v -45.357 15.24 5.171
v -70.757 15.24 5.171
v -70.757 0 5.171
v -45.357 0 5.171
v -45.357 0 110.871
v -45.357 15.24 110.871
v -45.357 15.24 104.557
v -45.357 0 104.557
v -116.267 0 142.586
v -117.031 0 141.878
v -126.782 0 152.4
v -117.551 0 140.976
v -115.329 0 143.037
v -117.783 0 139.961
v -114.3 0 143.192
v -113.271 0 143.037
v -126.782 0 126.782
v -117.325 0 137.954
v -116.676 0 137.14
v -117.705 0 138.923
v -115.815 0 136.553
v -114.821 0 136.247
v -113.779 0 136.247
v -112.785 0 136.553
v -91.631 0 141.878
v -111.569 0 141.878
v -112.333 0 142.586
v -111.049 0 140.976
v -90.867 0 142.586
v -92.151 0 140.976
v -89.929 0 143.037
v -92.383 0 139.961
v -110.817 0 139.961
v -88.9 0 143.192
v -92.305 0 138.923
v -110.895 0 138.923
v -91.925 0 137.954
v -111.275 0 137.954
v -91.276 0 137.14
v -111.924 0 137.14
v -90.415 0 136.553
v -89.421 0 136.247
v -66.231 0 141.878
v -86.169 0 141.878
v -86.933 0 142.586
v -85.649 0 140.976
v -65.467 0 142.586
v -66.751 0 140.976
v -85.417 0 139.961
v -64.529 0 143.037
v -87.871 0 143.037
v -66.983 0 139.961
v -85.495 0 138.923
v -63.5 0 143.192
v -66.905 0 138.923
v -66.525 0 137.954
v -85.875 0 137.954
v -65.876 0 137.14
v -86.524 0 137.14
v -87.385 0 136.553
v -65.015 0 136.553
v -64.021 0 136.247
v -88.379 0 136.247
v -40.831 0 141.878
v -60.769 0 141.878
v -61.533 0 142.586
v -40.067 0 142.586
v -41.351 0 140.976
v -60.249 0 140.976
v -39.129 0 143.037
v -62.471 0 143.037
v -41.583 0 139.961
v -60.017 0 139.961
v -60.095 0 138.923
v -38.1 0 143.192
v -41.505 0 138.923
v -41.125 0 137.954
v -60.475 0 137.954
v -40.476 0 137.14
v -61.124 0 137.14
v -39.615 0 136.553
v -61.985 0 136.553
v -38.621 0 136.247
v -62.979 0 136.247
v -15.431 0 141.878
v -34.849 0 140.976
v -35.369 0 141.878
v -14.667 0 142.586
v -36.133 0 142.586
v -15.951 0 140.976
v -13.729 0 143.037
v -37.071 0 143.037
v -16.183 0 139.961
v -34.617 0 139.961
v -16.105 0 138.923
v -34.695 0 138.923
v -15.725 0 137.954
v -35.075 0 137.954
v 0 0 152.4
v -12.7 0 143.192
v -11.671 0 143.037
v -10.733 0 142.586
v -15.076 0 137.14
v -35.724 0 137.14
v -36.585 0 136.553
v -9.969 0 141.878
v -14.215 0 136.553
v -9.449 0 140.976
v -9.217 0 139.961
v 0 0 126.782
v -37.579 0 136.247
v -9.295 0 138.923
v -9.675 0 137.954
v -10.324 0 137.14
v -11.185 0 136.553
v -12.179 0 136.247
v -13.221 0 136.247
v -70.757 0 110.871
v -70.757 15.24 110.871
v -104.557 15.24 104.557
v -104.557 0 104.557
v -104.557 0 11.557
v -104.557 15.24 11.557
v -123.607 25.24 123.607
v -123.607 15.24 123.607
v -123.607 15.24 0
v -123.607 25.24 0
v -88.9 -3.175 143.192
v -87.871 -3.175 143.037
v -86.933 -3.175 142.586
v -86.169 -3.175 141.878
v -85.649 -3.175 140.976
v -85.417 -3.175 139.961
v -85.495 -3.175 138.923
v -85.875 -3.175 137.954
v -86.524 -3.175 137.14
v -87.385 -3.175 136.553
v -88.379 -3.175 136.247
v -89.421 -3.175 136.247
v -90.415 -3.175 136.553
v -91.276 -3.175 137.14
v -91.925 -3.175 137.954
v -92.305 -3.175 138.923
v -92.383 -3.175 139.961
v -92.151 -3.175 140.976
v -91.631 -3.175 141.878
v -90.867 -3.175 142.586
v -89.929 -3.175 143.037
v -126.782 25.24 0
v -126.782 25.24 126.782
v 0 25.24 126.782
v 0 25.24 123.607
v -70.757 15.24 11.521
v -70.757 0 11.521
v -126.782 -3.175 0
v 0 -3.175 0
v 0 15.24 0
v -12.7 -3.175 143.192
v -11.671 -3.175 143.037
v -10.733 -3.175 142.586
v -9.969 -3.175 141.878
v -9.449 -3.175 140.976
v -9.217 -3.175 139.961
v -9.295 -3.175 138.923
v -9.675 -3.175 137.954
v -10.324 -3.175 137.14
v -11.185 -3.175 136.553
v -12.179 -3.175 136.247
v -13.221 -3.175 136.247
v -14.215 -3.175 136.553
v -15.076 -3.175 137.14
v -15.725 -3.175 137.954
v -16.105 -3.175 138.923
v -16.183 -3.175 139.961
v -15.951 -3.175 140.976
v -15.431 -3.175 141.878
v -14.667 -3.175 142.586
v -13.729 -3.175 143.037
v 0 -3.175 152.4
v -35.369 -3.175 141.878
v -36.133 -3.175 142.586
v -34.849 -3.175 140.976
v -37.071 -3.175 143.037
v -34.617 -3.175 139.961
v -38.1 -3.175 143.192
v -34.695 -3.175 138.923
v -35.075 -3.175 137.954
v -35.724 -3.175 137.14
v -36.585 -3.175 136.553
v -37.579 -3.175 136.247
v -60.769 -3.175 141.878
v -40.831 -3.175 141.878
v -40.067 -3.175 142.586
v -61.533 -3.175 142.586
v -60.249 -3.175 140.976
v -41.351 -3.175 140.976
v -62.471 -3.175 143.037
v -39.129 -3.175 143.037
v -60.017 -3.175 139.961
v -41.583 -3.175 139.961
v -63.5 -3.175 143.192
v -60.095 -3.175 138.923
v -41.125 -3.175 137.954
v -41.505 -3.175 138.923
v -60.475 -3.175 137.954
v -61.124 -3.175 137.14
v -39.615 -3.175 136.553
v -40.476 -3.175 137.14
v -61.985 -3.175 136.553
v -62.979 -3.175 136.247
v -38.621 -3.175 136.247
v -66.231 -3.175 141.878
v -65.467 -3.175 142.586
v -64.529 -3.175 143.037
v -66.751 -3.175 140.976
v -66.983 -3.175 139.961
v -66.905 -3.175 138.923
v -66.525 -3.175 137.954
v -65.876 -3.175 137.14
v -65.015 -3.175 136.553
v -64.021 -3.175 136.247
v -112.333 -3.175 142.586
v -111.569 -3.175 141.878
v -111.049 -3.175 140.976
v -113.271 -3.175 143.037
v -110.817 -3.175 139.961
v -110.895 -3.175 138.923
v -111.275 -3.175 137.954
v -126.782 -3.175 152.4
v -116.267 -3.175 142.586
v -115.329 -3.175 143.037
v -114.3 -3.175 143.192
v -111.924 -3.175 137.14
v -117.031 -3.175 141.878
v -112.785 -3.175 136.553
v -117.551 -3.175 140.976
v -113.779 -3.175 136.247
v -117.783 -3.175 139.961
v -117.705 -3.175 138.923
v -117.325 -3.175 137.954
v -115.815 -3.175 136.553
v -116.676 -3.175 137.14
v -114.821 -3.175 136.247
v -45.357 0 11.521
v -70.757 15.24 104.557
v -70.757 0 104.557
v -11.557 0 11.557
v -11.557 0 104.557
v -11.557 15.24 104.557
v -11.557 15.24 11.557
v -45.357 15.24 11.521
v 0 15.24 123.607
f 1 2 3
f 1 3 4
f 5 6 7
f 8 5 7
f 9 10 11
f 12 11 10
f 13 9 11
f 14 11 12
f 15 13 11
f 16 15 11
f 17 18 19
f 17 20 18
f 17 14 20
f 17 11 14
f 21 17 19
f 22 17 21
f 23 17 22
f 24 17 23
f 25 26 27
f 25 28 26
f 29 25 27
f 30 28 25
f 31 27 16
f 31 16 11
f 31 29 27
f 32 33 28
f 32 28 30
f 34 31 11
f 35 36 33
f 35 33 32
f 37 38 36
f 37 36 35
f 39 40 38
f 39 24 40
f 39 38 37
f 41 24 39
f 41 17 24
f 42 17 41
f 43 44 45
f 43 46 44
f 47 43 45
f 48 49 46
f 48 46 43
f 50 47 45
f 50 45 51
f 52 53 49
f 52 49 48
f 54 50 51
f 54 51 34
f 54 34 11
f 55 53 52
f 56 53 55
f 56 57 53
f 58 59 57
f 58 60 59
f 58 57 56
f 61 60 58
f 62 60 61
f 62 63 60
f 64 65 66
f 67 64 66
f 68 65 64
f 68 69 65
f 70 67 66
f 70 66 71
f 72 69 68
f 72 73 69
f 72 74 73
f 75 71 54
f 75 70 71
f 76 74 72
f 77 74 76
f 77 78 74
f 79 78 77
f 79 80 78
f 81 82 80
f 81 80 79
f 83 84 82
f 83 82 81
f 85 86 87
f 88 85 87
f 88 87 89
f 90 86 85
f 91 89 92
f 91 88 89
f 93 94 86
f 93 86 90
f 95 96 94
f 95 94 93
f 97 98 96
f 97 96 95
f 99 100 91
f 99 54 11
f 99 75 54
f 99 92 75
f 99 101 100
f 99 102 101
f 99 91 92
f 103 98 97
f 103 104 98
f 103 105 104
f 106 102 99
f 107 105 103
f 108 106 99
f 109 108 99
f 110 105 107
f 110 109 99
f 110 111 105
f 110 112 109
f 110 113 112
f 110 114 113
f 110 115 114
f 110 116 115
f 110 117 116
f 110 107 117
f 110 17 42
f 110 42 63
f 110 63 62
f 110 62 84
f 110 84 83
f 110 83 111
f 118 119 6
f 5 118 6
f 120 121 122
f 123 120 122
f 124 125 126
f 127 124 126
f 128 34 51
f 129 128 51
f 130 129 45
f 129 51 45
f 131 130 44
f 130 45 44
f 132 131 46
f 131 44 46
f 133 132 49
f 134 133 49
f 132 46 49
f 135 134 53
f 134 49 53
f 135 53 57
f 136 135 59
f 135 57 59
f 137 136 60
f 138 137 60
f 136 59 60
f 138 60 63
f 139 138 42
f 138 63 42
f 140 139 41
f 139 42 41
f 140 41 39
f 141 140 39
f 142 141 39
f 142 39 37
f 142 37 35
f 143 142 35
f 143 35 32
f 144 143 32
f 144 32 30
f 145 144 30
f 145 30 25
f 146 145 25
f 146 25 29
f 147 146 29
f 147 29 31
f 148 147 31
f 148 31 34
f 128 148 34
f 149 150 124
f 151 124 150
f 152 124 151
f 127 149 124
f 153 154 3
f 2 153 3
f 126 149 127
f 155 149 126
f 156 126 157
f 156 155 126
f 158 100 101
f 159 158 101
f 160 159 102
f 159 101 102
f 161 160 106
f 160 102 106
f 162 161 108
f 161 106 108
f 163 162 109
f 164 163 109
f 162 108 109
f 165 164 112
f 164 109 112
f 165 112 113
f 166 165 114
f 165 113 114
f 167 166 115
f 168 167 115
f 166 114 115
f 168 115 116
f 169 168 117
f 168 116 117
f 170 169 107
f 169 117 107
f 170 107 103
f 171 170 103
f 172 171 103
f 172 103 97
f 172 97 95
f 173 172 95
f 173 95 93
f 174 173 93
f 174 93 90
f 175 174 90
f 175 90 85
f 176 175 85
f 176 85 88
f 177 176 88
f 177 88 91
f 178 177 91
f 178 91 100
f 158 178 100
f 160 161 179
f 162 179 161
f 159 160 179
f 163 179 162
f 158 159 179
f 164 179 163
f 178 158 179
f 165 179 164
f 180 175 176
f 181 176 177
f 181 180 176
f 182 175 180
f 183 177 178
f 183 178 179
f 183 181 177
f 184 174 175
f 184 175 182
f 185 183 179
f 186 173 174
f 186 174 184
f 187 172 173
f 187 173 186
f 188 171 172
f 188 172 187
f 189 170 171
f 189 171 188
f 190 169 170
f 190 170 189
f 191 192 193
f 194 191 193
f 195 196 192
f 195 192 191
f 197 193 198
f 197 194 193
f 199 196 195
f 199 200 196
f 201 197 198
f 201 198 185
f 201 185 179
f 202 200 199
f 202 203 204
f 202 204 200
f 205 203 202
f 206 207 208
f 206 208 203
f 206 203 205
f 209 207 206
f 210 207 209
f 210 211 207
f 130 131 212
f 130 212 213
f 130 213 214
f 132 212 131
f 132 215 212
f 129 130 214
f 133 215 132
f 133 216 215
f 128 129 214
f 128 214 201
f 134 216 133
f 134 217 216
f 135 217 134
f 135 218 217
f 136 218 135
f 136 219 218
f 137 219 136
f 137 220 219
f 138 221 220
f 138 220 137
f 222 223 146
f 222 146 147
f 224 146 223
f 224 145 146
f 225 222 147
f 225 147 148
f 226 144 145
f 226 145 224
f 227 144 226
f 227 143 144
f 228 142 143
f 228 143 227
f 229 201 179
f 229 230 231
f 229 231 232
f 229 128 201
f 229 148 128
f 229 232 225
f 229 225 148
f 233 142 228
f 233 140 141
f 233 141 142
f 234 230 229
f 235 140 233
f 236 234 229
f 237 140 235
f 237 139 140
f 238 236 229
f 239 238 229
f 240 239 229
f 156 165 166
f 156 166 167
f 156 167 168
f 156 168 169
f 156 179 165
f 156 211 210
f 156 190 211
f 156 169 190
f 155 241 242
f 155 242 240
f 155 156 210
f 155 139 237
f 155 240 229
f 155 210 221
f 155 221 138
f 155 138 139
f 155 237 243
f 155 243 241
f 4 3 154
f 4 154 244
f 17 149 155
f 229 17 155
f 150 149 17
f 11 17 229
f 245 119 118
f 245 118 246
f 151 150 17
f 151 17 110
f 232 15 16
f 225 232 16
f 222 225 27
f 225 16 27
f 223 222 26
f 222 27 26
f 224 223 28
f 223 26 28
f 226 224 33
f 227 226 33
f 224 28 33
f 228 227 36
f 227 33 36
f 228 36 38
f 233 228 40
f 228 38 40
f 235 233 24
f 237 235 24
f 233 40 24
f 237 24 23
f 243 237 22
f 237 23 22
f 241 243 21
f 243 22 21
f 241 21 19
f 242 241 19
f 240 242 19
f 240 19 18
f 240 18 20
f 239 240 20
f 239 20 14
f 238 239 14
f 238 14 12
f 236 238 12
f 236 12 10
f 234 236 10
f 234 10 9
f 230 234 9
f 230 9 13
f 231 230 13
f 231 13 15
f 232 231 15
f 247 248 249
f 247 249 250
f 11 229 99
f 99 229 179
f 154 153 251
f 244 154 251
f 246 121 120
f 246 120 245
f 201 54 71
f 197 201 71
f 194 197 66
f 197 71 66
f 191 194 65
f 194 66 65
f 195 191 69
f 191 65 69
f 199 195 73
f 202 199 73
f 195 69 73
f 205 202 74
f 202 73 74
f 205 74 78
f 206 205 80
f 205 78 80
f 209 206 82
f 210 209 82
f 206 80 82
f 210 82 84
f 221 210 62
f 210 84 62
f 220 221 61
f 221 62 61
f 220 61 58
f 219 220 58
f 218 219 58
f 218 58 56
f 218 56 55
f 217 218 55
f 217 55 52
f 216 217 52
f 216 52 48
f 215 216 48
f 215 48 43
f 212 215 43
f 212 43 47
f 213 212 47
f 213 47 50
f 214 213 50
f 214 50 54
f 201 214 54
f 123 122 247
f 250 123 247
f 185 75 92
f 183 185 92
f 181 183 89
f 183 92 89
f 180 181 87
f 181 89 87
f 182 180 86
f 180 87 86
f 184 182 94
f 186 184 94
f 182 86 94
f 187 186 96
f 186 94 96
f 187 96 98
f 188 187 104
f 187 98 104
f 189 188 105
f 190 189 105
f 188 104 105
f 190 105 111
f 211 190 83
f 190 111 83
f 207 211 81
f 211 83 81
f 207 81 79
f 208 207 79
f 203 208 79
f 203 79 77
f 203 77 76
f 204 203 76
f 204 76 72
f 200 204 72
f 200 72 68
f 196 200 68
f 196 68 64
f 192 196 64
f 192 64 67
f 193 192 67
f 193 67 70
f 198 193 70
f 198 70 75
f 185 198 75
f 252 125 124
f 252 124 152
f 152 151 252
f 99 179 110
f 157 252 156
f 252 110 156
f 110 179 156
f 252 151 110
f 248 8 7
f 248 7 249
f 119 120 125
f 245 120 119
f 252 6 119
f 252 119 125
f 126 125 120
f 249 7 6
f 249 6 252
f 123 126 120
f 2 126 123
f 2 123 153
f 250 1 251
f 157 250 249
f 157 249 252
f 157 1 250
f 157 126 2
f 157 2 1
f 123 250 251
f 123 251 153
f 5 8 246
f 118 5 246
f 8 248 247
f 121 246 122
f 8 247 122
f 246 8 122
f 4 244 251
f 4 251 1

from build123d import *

# Parameters (mm, degrees)
SKETCH1_W               = 304.8
SKETCH1_H               = 304.8
SKETCH1_W_2             = 93
SKETCH1_H_2             = 93
BOSS_EXTRUDE1_DEPTH     = 15.24
SKETCH2_W               = 304.8
SKETCH2_H               = 304.8
BOSS_EXTRUDE2_DEPTH     = 3.175
SKETCH3_W               = 304.8
SKETCH3_H               = 304.8
SKETCH3_W_2             = 247.214
SKETCH3_H_2             = 247.214
BOSS_EXTRUDE3_DEPTH     = 10
SKETCH4_OUTSIDE_W       = 393.198
SKETCH4_OUTSIDE_H       = 393.198
SKETCH4_OUTSIDE_W_2     = 253.564
SKETCH4_OUTSIDE_H_2     = 253.564
CUT_EXTRUDE1_DEPTH      = 25.24
SKETCH5_R               = 3.4925
CUT_EXTRUDE2_DEPTH      = 217.999026726
SKETCH6_W               = 25.4
SKETCH6_H               = 6.35
CUT_EXTRUDE3_DEPTH      = 15.24
LPATTERN1_COUNT         = 2
LPATTERN1_PITCH         = 116.078
LPATTERN1_COUNT_DIR2    = 2
LPATTERN1_PITCH_DIR2    = 116.078
SKETCH7_W               = 388.208697242
SKETCH7_H               = 185.968986832
CUT_EXTRUDE4_DEPTH      = 320.069595424
SKETCH8_W               = 545.051384684
SKETCH8_H               = 463.265958
CUT_EXTRUDE5_DEPTH      = 320.069595424
SKETCH9_W               = 585.539242267
SKETCH9_H               = 383.639310532
CUT_EXTRUDE6_DEPTH      = 297.913320173
CUT_EXTRUDE7_DEPTH      = 200.841169742
CUT_EXTRUDE7_DEPTH_BACK = 200.841169742
SKETCH10_OUTSIDE_W      = 331.206
SKETCH10_OUTSIDE_H      = 356.824
SKETCH10_OUTSIDE_W_2    = 142.114384532
SKETCH10_OUTSIDE_H_2    = 171.89804786


with BuildPart() as part:
    # Sketch1 → Boss-Extrude1 (new body)
    with BuildSketch(Plane(origin=(0, 0, 0), x_dir=(1, 0, 0), z_dir=(0, 1, 0))):
        Rectangle(SKETCH1_W, SKETCH1_H)
        with Locations((58.057, 58.057)):
            Rectangle(SKETCH1_W_2, SKETCH1_H_2, mode=Mode.SUBTRACT)
        with Locations((-58.057, 58.057)):
            Rectangle(SKETCH1_W_2, SKETCH1_H_2, mode=Mode.SUBTRACT)
        with Locations((-58.057, -58.057)):
            Rectangle(SKETCH1_W_2, SKETCH1_H_2, mode=Mode.SUBTRACT)
        with Locations((58.057, -58.057)):
            Rectangle(SKETCH1_W_2, SKETCH1_H_2, mode=Mode.SUBTRACT)
    extrude(amount=BOSS_EXTRUDE1_DEPTH)

    # Sketch2 → Boss-Extrude2 (add)
    with BuildSketch(Plane(origin=(0, 0, 0), x_dir=(-1, 0, 0), z_dir=(0, -1, 0))):
        Rectangle(SKETCH2_W, SKETCH2_H)
    extrude(amount=BOSS_EXTRUDE2_DEPTH)

    # Sketch3 → Boss-Extrude3 (add)
    with BuildSketch(Plane(origin=(0, 15.24, 0), x_dir=(1, 0, 0), z_dir=(0, 1, 0))):
        Rectangle(SKETCH3_W, SKETCH3_H)
        Rectangle(SKETCH3_W_2, SKETCH3_H_2, mode=Mode.SUBTRACT)
    extrude(amount=BOSS_EXTRUDE3_DEPTH)

    # Sketch4 outside → Cut-Extrude1 (cut)
    with BuildSketch(Plane(origin=(0, 25.24, 0), x_dir=(1, 0, 0), z_dir=(0, 1, 0))):
        Rectangle(SKETCH4_OUTSIDE_W, SKETCH4_OUTSIDE_H)
        Rectangle(SKETCH4_OUTSIDE_W_2, SKETCH4_OUTSIDE_H_2, mode=Mode.SUBTRACT)
    extrude(amount=-CUT_EXTRUDE1_DEPTH, mode=Mode.SUBTRACT)

    # Sketch5 → Cut-Extrude2 (cut, through all)
    with BuildSketch(Plane(origin=(0, 0, 0), x_dir=(1, 0, 0), z_dir=(0, 1, 0))):
        with Locations(Location((-139.7, -139.7, 0), (0, 0, 270))):
            Circle(SKETCH5_R)
        with Locations(Location((-114.3, -139.7, 0), (0, 0, 270))):
            Circle(SKETCH5_R)
        with Locations(Location((-88.9, -139.7, 0), (0, 0, 270))):
            Circle(SKETCH5_R)
        with Locations(Location((-63.5, -139.7, 0), (0, 0, 270))):
            Circle(SKETCH5_R)
        with Locations(Location((-38.1, -139.7, 0), (0, 0, 270))):
            Circle(SKETCH5_R)
        with Locations(Location((-12.7, -139.7, 0), (0, 0, 270))):
            Circle(SKETCH5_R)
        with Locations(Location((12.7, -139.7, 0), (0, 0, 270))):
            Circle(SKETCH5_R)
        with Locations(Location((38.1, -139.7, 0), (0, 0, 270))):
            Circle(SKETCH5_R)
        with Locations(Location((63.5, -139.7, 0), (0, 0, 270))):
            Circle(SKETCH5_R)
        with Locations(Location((88.9, -139.7, 0), (0, 0, 270))):
            Circle(SKETCH5_R)
        with Locations(Location((114.3, -139.7, 0), (0, 0, 270))):
            Circle(SKETCH5_R)
        with Locations(Location((139.7, -139.7, 0), (0, 0, 270))):
            Circle(SKETCH5_R)
        with Locations(Location((-139.7, -114.3, 0), (0, 0, 270))):
            Circle(SKETCH5_R)
        with Locations(Location((-139.7, -88.9, 0), (0, 0, 270))):
            Circle(SKETCH5_R)
        with Locations(Location((-139.7, -63.5, 0), (0, 0, 270))):
            Circle(SKETCH5_R)
        with Locations(Location((-139.7, -38.1, 0), (0, 0, 270))):
            Circle(SKETCH5_R)
        with Locations(Location((-139.7, -12.7, 0), (0, 0, 270))):
            Circle(SKETCH5_R)
        with Locations(Location((-139.7, 12.7, 0), (0, 0, 270))):
            Circle(SKETCH5_R)
        with Locations(Location((-139.7, 38.1, 0), (0, 0, 270))):
            Circle(SKETCH5_R)
        with Locations(Location((-139.7, 63.5, 0), (0, 0, 270))):
            Circle(SKETCH5_R)
        with Locations(Location((-139.7, 88.9, 0), (0, 0, 270))):
            Circle(SKETCH5_R)
        with Locations(Location((-139.7, 114.3, 0), (0, 0, 270))):
            Circle(SKETCH5_R)
        with Locations(Location((-139.7, 139.7, 0), (0, 0, 270))):
            Circle(SKETCH5_R)
        with Locations(Location((-114.3, 139.7, 0), (0, 0, 270))):
            Circle(SKETCH5_R)
        with Locations(Location((-88.9, 139.7, 0), (0, 0, 270))):
            Circle(SKETCH5_R)
        with Locations(Location((-63.5, 139.7, 0), (0, 0, 270))):
            Circle(SKETCH5_R)
        with Locations(Location((-38.1, 139.7, 0), (0, 0, 270))):
            Circle(SKETCH5_R)
        with Locations(Location((-12.7, 139.7, 0), (0, 0, 270))):
            Circle(SKETCH5_R)
        with Locations(Location((12.7, 139.7, 0), (0, 0, 270))):
            Circle(SKETCH5_R)
        with Locations(Location((38.1, 139.7, 0), (0, 0, 270))):
            Circle(SKETCH5_R)
        with Locations(Location((63.5, 139.7, 0), (0, 0, 270))):
            Circle(SKETCH5_R)
        with Locations(Location((88.9, 139.7, 0), (0, 0, 270))):
            Circle(SKETCH5_R)
        with Locations(Location((114.3, 139.7, 0), (0, 0, 270))):
            Circle(SKETCH5_R)
        with Locations(Location((139.7, 139.7, 0), (0, 0, 270))):
            Circle(SKETCH5_R)
        with Locations(Location((139.7, 114.3, 0), (0, 0, 270))):
            Circle(SKETCH5_R)
        with Locations(Location((139.7, 88.9, 0), (0, 0, 270))):
            Circle(SKETCH5_R)
        with Locations(Location((139.7, 63.5, 0), (0, 0, 270))):
            Circle(SKETCH5_R)
        with Locations(Location((139.7, 38.1, 0), (0, 0, 270))):
            Circle(SKETCH5_R)
        with Locations(Location((139.7, 12.7, 0), (0, 0, 270))):
            Circle(SKETCH5_R)
        with Locations(Location((139.7, -12.7, 0), (0, 0, 270))):
            Circle(SKETCH5_R)
        with Locations(Location((139.7, -38.1, 0), (0, 0, 270))):
            Circle(SKETCH5_R)
        with Locations(Location((139.7, -63.5, 0), (0, 0, 270))):
            Circle(SKETCH5_R)
        with Locations(Location((139.7, -88.9, 0), (0, 0, 270))):
            Circle(SKETCH5_R)
        with Locations(Location((139.7, -114.3, 0), (0, 0, 270))):
            Circle(SKETCH5_R)
    extrude(amount=-CUT_EXTRUDE2_DEPTH, mode=Mode.SUBTRACT)

    # Sketch6 → Cut-Extrude3 (cut)
    with BuildSketch(Plane(origin=(0, 15.24, 0), x_dir=(1, 0, 0), z_dir=(0, 1, 0))):
        with Locations((-58.057, 107.732)):
            Rectangle(SKETCH6_W, SKETCH6_H)
        with Locations((-58.057, 8.382)):
            Rectangle(SKETCH6_W, SKETCH6_H)
    cut_extrude3 = extrude(amount=-CUT_EXTRUDE3_DEPTH, mode=Mode.SUBTRACT)

    # LPattern1: Cut-Extrude3 2 × 2
    with Locations(*[(i * LPATTERN1_PITCH, 0, j * LPATTERN1_PITCH_DIR2) for i in range(LPATTERN1_COUNT) for j in range(LPATTERN1_COUNT_DIR2) if (i, j) != (0, 0)]):
        add(cut_extrude3, mode=Mode.SUBTRACT)

    # Sketch7 → Cut-Extrude4 (cut, through all)
    with BuildSketch(Plane(origin=(0, 0, -126.782), x_dir=(-1, 0, 0), z_dir=(0, 0, -1))):
        with Locations((-26.237813245, -25.540582214)):
            Rectangle(SKETCH7_W, SKETCH7_H)
    extrude(amount=CUT_EXTRUDE4_DEPTH, mode=Mode.SUBTRACT)

    # Sketch8 → Cut-Extrude5 (cut, through all)
    with BuildSketch(Plane.ZY.offset(126.782)):
        with Locations((35.238029092, 25.908608745)):
            Rectangle(SKETCH8_W, SKETCH8_H)
    extrude(amount=CUT_EXTRUDE5_DEPTH, mode=Mode.SUBTRACT)

    # Sketch9 → Cut-Extrude6 (cut, through all)
    with BuildSketch(Plane(origin=(126.782, 0, 0), x_dir=(0, 0, -1), z_dir=(1, 0, 0))):
        with Locations((26.844145207, 44.758305083)):
            Rectangle(SKETCH9_W, SKETCH9_H)
    extrude(amount=CUT_EXTRUDE6_DEPTH, mode=Mode.SUBTRACT)

    # Sketch10 outside → Cut-Extrude7 (cut, two sides: drawn at the far end of the back side and taken through both)
    with BuildSketch(Plane(origin=(0, 0, 0), x_dir=(1, 0, 0), z_dir=(0, 1, 0)).offset(-CUT_EXTRUDE7_DEPTH_BACK)):
        with Locations((0, -12.809)):
            Rectangle(SKETCH10_OUTSIDE_W, SKETCH10_OUTSIDE_H)
        with Locations((-71.057192266, -85.94902393)):
            Rectangle(SKETCH10_OUTSIDE_W_2, SKETCH10_OUTSIDE_H_2, mode=Mode.SUBTRACT)
    extrude(amount=CUT_EXTRUDE7_DEPTH + CUT_EXTRUDE7_DEPTH_BACK, mode=Mode.SUBTRACT)


solid = part.part
